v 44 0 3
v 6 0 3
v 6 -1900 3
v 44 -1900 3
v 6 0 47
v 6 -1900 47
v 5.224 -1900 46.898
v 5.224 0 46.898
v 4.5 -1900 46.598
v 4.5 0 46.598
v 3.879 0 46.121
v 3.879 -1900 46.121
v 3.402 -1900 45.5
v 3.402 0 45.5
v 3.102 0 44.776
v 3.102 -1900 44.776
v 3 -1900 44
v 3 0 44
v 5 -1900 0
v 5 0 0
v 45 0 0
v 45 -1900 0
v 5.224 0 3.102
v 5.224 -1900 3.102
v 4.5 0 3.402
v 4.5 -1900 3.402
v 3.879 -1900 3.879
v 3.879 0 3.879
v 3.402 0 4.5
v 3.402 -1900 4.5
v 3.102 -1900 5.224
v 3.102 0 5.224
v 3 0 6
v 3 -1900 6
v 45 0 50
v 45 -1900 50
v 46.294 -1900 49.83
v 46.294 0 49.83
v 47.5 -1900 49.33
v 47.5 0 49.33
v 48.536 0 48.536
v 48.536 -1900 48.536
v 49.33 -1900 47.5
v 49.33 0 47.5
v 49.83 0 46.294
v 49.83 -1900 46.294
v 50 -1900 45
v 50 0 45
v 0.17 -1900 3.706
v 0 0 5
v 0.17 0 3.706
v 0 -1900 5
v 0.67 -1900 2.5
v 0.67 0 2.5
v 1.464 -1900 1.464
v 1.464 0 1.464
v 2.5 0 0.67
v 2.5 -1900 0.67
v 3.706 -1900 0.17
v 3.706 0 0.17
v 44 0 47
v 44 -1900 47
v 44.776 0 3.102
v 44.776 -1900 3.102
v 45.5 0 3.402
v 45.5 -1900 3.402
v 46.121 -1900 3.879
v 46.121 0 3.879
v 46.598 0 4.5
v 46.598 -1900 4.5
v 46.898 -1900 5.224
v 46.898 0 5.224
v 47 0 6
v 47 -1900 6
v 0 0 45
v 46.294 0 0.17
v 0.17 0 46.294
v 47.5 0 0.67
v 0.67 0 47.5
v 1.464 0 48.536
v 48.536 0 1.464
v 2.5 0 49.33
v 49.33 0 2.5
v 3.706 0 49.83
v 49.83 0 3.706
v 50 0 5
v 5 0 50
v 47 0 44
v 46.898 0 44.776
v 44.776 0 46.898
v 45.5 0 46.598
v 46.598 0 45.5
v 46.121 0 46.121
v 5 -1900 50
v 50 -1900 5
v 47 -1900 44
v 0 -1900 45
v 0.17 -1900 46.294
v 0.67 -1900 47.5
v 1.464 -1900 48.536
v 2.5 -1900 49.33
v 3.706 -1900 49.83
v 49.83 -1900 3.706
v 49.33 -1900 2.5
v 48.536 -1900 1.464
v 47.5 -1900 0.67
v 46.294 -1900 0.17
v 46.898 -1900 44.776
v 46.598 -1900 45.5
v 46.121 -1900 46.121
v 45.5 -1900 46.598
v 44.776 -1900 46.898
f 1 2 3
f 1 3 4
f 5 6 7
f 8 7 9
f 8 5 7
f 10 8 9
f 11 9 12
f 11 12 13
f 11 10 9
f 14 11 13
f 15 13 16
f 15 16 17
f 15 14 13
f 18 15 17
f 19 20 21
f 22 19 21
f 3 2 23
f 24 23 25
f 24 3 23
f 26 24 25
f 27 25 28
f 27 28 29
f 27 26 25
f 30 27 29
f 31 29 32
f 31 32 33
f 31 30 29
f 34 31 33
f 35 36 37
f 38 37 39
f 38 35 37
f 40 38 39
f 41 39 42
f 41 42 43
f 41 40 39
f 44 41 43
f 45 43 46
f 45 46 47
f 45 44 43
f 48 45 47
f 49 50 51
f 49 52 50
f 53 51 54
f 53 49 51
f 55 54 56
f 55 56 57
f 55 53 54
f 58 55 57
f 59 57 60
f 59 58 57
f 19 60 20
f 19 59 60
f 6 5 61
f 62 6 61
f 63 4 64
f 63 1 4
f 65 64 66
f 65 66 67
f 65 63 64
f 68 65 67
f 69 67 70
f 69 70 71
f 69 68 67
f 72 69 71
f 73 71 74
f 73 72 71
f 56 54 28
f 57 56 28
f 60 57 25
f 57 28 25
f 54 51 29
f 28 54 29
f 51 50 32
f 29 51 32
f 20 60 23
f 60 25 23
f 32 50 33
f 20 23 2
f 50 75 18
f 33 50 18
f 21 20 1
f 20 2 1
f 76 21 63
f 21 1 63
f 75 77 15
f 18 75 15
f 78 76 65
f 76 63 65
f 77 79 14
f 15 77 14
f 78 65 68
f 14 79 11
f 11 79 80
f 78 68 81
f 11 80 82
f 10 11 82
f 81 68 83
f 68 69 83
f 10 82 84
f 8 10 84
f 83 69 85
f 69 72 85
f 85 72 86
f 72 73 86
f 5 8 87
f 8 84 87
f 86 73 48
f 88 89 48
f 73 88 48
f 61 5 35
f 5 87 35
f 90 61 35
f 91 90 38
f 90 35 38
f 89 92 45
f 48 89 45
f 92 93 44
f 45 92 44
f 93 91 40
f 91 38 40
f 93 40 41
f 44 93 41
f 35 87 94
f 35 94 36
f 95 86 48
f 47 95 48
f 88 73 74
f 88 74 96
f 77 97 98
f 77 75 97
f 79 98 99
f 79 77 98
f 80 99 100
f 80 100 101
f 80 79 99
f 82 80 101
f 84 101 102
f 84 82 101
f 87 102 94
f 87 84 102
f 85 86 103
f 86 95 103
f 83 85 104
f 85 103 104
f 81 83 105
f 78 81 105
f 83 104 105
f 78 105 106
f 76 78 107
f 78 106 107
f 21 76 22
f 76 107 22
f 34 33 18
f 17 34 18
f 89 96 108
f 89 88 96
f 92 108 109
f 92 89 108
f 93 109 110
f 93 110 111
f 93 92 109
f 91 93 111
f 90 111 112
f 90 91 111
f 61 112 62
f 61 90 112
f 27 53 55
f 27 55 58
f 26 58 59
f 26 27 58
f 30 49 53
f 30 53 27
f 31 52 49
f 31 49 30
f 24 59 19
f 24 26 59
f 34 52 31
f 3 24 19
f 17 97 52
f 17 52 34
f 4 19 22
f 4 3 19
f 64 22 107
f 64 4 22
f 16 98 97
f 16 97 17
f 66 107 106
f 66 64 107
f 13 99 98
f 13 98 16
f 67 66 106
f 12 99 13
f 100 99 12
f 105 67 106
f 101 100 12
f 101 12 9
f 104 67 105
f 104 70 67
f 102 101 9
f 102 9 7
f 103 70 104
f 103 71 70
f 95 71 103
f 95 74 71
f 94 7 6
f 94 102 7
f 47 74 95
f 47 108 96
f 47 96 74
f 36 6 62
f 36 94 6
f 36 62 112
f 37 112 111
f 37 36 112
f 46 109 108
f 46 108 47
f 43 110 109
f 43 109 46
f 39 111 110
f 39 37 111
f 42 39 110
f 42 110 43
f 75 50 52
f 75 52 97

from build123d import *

# Parameters (mm, degrees)
F0_W     = 50
F0_H     = 50
F0_W_2   = 44
F0_H_2   = 44
F1_DEPTH = 1900
F2_DEPTH = 100
F3_R     = 5
F4_R     = 3


with BuildPart() as f1:
    # F0 (on Front) → F1 (new body)
    with BuildSketch(Plane.XZ):
        with Locations((25, 25)):
            Rectangle(F0_W, F0_H)
        with Locations((25, 25)):
            Rectangle(F0_W_2, F0_H_2, mode=Mode.SUBTRACT)
    extrude(amount=F1_DEPTH)

    # F0 (on Front) → F2 (join)
    with BuildSketch(Plane.XZ):
        with Locations((25, 25)):
            Rectangle(F0_W, F0_H)
        with Locations((25, 25)):
            Rectangle(F0_W_2, F0_H_2, mode=Mode.SUBTRACT)
    extrude(amount=F2_DEPTH)

    # F3
    f3_edges = [f1.edges().sort_by_distance(p)[0] for p in [
        (50, -950, 50),
        (50, -950, 0),
        (0, -950, 0),
        (0, -950, 50),
    ]]
    fillet(f3_edges, radius=F3_R)

    # F4
    f4_edges = [f1.edges().sort_by_distance(p)[0] for p in [
        (47, -950, 47),
        (3, -950, 3),
        (3, -950, 47),
        (47, -950, 3),
    ]]
    fillet(f4_edges, radius=F4_R)


solid = f1.part
